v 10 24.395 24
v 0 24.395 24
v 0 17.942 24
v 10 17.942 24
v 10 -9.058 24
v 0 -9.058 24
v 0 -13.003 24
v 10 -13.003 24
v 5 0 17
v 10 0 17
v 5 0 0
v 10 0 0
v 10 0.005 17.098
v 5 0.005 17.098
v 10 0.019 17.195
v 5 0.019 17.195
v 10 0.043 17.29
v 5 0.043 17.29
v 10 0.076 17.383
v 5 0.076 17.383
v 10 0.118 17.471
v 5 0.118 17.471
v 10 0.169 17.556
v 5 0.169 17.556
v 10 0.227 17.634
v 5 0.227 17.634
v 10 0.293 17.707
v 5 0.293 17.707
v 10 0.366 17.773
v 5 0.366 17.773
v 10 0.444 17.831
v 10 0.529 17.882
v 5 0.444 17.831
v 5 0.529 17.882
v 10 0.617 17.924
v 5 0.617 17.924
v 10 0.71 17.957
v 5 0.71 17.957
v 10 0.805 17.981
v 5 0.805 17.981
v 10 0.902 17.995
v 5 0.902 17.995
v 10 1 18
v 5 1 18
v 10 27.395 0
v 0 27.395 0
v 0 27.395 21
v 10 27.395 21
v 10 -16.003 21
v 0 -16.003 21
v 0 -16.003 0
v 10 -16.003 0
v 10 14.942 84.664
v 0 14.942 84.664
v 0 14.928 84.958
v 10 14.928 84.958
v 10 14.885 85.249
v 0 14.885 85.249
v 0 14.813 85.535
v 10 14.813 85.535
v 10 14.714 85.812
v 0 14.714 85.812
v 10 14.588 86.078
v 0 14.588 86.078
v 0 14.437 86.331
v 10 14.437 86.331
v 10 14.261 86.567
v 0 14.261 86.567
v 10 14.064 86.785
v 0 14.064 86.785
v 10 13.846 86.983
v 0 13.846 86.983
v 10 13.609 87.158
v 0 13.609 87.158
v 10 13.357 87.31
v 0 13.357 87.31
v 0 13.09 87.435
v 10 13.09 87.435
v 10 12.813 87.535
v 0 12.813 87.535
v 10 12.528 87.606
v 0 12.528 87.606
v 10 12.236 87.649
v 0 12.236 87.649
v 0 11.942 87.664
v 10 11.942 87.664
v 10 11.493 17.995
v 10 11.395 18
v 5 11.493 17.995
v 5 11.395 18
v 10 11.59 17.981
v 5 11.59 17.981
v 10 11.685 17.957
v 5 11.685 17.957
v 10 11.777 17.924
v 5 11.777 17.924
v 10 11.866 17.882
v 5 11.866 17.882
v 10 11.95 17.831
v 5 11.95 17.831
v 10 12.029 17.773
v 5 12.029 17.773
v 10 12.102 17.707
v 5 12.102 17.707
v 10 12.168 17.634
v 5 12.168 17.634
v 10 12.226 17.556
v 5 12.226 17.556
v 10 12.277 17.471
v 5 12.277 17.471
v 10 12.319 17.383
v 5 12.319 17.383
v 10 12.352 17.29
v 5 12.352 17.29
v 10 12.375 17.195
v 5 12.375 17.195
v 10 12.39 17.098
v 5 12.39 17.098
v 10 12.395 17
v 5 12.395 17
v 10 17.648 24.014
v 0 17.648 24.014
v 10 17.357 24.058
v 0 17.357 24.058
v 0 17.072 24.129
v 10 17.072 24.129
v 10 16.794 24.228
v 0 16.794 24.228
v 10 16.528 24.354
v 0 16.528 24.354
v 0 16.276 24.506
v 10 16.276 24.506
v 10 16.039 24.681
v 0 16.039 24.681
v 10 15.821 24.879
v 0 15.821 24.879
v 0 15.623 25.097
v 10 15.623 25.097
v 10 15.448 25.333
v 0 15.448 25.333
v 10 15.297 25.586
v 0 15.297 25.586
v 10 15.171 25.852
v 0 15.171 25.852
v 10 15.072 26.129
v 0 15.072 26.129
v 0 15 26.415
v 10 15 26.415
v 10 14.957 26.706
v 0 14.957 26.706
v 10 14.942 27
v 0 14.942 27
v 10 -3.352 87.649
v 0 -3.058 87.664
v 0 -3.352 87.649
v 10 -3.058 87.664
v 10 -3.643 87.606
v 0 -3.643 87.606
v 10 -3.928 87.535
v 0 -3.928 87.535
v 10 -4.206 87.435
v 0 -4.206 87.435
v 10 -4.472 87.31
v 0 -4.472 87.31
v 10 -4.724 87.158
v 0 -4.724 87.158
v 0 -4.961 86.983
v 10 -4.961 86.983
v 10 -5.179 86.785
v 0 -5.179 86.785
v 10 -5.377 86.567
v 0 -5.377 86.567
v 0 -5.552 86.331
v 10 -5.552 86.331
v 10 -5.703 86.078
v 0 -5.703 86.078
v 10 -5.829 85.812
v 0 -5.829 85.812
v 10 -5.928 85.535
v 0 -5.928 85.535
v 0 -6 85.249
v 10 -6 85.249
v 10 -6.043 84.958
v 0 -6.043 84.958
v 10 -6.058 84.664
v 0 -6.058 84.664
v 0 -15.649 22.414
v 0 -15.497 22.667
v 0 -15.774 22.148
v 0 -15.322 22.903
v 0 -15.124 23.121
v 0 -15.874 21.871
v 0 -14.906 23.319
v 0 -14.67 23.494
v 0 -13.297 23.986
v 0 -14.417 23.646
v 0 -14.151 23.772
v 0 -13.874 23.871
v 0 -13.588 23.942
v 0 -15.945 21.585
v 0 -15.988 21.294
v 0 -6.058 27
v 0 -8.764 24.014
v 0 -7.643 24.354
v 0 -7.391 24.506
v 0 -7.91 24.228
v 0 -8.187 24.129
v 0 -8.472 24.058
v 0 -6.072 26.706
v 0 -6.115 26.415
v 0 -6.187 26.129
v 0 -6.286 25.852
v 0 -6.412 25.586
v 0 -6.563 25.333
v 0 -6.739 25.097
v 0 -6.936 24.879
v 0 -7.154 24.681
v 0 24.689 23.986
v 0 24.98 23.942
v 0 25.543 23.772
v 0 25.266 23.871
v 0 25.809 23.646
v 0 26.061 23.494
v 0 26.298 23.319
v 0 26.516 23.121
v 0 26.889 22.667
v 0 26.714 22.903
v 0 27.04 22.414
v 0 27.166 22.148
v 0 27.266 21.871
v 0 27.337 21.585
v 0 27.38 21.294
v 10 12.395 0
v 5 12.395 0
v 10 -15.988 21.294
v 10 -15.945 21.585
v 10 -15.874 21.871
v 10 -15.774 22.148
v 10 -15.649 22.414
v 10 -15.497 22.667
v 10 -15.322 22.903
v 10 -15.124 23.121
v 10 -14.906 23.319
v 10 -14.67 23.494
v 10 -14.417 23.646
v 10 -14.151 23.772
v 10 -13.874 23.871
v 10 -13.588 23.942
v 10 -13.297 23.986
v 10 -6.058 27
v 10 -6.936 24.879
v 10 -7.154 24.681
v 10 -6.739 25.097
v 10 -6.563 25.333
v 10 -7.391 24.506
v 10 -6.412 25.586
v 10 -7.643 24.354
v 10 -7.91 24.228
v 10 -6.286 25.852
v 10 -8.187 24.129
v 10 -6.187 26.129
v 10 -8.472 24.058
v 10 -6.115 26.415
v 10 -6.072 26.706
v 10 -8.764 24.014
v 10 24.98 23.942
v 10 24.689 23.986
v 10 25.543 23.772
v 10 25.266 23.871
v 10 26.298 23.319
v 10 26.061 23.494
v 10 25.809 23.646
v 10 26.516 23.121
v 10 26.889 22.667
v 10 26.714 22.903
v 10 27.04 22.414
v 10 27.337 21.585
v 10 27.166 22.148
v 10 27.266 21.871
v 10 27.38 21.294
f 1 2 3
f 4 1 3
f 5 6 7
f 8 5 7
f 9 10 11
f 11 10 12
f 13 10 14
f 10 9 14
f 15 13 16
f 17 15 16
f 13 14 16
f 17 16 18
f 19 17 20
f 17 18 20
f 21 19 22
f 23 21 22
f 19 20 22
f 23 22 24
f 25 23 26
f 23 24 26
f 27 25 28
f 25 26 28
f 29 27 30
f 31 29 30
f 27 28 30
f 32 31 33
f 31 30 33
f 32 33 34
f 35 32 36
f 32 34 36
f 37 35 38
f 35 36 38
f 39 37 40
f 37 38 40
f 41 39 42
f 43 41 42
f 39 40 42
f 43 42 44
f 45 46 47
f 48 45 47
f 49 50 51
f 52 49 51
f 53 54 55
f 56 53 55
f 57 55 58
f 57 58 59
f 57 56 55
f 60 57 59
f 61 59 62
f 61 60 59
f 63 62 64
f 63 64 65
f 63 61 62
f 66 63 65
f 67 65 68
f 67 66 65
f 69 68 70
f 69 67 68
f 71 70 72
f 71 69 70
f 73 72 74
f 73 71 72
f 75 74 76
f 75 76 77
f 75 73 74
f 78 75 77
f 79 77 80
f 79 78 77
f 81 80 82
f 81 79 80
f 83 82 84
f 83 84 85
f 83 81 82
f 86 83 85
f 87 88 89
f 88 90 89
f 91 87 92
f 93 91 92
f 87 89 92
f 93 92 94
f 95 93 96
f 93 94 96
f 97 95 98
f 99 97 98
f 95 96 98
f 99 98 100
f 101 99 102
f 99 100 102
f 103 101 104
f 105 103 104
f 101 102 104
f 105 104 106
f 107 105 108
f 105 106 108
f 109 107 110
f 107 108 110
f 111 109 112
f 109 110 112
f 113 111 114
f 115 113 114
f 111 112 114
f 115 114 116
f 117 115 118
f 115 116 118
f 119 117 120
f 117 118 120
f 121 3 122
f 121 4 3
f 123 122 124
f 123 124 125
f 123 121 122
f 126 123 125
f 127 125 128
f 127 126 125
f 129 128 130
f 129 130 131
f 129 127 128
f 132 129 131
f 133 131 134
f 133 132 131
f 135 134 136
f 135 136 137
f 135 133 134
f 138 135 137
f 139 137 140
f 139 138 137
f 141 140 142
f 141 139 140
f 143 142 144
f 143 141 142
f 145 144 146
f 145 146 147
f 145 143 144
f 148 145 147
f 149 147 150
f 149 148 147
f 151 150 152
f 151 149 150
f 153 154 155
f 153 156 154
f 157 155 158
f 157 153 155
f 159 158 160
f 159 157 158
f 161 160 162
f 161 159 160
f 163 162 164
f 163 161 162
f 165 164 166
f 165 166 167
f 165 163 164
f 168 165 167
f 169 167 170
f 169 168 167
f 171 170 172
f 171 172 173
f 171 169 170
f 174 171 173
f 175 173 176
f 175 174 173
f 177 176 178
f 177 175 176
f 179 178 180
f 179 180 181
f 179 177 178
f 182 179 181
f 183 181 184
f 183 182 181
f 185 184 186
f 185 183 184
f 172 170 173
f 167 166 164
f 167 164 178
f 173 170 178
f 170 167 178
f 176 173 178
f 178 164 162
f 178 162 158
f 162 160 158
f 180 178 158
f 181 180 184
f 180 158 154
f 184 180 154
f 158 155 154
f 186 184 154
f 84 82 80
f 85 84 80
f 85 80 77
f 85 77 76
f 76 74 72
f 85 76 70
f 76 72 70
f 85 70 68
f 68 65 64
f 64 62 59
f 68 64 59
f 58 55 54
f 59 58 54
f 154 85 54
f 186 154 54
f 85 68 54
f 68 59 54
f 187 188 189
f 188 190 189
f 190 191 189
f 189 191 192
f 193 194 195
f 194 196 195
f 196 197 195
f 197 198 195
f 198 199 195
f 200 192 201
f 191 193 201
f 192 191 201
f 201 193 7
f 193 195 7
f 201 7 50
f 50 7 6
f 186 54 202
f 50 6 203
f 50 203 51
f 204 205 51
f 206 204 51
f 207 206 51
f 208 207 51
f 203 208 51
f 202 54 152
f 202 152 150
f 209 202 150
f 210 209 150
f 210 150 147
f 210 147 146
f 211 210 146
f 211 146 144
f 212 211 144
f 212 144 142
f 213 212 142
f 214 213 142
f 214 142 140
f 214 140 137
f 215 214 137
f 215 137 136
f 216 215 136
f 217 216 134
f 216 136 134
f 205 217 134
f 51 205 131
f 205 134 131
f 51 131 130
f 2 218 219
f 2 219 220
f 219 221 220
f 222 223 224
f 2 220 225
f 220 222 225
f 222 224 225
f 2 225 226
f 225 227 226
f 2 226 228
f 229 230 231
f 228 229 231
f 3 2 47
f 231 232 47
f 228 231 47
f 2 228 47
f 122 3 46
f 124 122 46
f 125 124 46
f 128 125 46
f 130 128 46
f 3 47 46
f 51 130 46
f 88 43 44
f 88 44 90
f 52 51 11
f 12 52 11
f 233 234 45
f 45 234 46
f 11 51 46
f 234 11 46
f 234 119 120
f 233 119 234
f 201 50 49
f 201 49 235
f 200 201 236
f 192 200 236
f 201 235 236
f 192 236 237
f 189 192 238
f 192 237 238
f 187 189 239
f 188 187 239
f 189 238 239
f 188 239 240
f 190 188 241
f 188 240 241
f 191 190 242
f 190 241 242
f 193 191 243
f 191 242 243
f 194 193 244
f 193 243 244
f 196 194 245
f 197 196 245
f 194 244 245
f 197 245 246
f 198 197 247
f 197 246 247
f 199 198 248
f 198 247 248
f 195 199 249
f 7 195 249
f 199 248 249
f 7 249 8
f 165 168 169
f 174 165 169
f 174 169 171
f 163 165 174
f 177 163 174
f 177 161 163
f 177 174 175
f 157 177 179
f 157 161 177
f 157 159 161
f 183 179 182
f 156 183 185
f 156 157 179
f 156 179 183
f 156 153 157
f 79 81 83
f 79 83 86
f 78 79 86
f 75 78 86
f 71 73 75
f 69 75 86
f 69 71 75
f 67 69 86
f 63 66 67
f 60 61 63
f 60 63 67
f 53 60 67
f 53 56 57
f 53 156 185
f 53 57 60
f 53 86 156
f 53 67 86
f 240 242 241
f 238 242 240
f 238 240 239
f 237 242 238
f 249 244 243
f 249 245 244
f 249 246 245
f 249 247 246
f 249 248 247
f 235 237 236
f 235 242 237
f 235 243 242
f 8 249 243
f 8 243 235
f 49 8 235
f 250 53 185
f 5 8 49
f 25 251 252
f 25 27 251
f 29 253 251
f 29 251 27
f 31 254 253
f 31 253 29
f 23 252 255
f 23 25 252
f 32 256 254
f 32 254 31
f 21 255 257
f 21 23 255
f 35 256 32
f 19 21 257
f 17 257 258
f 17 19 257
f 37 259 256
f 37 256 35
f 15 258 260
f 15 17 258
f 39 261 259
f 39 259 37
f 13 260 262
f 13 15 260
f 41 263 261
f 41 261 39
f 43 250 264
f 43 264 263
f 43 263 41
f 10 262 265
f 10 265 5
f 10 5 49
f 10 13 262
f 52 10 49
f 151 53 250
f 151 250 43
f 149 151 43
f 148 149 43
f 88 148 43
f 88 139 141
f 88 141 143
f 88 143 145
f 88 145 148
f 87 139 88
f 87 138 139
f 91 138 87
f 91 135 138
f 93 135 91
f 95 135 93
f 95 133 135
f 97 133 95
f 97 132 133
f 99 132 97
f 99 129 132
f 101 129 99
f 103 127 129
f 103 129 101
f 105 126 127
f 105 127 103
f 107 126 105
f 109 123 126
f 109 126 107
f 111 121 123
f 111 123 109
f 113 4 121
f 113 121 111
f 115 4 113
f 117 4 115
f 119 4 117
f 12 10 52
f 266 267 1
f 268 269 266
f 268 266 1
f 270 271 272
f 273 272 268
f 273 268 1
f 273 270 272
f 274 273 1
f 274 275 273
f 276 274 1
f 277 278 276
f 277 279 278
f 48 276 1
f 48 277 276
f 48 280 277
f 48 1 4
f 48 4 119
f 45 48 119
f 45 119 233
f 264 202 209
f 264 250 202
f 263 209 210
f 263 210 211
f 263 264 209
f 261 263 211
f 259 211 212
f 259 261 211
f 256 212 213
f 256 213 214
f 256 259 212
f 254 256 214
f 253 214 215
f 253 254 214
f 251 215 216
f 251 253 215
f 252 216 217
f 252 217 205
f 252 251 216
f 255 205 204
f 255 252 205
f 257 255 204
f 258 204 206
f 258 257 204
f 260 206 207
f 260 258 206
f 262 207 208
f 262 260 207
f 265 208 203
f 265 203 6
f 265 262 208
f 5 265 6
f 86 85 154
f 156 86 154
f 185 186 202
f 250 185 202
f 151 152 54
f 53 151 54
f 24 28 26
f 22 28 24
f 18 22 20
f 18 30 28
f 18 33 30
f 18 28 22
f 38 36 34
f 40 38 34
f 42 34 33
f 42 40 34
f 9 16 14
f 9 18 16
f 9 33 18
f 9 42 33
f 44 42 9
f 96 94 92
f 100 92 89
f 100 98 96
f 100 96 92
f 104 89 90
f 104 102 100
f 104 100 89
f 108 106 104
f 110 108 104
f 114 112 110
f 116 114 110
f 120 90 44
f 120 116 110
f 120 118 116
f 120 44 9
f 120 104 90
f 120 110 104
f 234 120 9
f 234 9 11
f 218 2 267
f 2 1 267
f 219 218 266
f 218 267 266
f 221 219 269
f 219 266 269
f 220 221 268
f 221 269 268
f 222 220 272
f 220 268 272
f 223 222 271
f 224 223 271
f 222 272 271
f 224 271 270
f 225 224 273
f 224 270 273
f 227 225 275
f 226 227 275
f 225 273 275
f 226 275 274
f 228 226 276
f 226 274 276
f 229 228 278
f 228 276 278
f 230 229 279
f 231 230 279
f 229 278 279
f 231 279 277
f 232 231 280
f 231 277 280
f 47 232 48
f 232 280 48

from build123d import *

# Parameters (mm, degrees)
SALIENTE_EXTRUIR1_DEPTH = 10
CROQUIS2_W              = 18
CROQUIS2_H              = 12.394708995
CORTAR_EXTRUIR1_DEPTH   = 5
REDONDEO1_R             = 3
REDONDEO2_R             = 3
REDONDEO3_R             = 1


with BuildPart() as part:
    # Croquis1 → Saliente-Extruir1 (new body)
    with BuildSketch(Plane(origin=(0, 0, 0), x_dir=(0, 0, -1), z_dir=(1, 0, 0))):
        Polygon((0, -10.216508635), (0, 27.394708995), (-24, 27.394708995), (-24, 14.942424084), (-87.663818946, 14.942424084), (-87.663818946, -6.057575916), (-24, -6.057575916), (-24, -16.002849809), (0, -16.002849809), align=None)
    extrude(amount=SALIENTE_EXTRUIR1_DEPTH)

    # Croquis2 → Cortar-Extruir1 (cut)
    with BuildSketch(Plane(origin=(10, 0, 0), x_dir=(0, 0, -1), z_dir=(1, 0, 0))):
        with Locations((-9, 6.197354498)):
            Rectangle(CROQUIS2_W, CROQUIS2_H)
    extrude(amount=-CORTAR_EXTRUIR1_DEPTH, mode=Mode.SUBTRACT)

    # Redondeo1
    redondeo1_edges = [part.edges().sort_by_distance(p)[0] for p in [
        (5, -6.057575916, 24),
        (5, 14.942424084, 24),
    ]]
    fillet(redondeo1_edges, radius=REDONDEO1_R)

    # Redondeo2
    redondeo2_edges = [part.edges().sort_by_distance(p)[0] for p in [
        (5, -16.002849809, 24),
        (5, -6.057575916, 87.663818946),
        (5, 14.942424084, 87.663818946),
        (5, 27.394708995, 24),
    ]]
    fillet(redondeo2_edges, radius=REDONDEO2_R)

    # Redondeo3
    redondeo3_edges = [part.edges().sort_by_distance(p)[0] for p in [
        (7.5, 0, 18),
        (7.5, 12.394708995, 18),
    ]]
    fillet(redondeo3_edges, radius=REDONDEO3_R)


solid = part.part
